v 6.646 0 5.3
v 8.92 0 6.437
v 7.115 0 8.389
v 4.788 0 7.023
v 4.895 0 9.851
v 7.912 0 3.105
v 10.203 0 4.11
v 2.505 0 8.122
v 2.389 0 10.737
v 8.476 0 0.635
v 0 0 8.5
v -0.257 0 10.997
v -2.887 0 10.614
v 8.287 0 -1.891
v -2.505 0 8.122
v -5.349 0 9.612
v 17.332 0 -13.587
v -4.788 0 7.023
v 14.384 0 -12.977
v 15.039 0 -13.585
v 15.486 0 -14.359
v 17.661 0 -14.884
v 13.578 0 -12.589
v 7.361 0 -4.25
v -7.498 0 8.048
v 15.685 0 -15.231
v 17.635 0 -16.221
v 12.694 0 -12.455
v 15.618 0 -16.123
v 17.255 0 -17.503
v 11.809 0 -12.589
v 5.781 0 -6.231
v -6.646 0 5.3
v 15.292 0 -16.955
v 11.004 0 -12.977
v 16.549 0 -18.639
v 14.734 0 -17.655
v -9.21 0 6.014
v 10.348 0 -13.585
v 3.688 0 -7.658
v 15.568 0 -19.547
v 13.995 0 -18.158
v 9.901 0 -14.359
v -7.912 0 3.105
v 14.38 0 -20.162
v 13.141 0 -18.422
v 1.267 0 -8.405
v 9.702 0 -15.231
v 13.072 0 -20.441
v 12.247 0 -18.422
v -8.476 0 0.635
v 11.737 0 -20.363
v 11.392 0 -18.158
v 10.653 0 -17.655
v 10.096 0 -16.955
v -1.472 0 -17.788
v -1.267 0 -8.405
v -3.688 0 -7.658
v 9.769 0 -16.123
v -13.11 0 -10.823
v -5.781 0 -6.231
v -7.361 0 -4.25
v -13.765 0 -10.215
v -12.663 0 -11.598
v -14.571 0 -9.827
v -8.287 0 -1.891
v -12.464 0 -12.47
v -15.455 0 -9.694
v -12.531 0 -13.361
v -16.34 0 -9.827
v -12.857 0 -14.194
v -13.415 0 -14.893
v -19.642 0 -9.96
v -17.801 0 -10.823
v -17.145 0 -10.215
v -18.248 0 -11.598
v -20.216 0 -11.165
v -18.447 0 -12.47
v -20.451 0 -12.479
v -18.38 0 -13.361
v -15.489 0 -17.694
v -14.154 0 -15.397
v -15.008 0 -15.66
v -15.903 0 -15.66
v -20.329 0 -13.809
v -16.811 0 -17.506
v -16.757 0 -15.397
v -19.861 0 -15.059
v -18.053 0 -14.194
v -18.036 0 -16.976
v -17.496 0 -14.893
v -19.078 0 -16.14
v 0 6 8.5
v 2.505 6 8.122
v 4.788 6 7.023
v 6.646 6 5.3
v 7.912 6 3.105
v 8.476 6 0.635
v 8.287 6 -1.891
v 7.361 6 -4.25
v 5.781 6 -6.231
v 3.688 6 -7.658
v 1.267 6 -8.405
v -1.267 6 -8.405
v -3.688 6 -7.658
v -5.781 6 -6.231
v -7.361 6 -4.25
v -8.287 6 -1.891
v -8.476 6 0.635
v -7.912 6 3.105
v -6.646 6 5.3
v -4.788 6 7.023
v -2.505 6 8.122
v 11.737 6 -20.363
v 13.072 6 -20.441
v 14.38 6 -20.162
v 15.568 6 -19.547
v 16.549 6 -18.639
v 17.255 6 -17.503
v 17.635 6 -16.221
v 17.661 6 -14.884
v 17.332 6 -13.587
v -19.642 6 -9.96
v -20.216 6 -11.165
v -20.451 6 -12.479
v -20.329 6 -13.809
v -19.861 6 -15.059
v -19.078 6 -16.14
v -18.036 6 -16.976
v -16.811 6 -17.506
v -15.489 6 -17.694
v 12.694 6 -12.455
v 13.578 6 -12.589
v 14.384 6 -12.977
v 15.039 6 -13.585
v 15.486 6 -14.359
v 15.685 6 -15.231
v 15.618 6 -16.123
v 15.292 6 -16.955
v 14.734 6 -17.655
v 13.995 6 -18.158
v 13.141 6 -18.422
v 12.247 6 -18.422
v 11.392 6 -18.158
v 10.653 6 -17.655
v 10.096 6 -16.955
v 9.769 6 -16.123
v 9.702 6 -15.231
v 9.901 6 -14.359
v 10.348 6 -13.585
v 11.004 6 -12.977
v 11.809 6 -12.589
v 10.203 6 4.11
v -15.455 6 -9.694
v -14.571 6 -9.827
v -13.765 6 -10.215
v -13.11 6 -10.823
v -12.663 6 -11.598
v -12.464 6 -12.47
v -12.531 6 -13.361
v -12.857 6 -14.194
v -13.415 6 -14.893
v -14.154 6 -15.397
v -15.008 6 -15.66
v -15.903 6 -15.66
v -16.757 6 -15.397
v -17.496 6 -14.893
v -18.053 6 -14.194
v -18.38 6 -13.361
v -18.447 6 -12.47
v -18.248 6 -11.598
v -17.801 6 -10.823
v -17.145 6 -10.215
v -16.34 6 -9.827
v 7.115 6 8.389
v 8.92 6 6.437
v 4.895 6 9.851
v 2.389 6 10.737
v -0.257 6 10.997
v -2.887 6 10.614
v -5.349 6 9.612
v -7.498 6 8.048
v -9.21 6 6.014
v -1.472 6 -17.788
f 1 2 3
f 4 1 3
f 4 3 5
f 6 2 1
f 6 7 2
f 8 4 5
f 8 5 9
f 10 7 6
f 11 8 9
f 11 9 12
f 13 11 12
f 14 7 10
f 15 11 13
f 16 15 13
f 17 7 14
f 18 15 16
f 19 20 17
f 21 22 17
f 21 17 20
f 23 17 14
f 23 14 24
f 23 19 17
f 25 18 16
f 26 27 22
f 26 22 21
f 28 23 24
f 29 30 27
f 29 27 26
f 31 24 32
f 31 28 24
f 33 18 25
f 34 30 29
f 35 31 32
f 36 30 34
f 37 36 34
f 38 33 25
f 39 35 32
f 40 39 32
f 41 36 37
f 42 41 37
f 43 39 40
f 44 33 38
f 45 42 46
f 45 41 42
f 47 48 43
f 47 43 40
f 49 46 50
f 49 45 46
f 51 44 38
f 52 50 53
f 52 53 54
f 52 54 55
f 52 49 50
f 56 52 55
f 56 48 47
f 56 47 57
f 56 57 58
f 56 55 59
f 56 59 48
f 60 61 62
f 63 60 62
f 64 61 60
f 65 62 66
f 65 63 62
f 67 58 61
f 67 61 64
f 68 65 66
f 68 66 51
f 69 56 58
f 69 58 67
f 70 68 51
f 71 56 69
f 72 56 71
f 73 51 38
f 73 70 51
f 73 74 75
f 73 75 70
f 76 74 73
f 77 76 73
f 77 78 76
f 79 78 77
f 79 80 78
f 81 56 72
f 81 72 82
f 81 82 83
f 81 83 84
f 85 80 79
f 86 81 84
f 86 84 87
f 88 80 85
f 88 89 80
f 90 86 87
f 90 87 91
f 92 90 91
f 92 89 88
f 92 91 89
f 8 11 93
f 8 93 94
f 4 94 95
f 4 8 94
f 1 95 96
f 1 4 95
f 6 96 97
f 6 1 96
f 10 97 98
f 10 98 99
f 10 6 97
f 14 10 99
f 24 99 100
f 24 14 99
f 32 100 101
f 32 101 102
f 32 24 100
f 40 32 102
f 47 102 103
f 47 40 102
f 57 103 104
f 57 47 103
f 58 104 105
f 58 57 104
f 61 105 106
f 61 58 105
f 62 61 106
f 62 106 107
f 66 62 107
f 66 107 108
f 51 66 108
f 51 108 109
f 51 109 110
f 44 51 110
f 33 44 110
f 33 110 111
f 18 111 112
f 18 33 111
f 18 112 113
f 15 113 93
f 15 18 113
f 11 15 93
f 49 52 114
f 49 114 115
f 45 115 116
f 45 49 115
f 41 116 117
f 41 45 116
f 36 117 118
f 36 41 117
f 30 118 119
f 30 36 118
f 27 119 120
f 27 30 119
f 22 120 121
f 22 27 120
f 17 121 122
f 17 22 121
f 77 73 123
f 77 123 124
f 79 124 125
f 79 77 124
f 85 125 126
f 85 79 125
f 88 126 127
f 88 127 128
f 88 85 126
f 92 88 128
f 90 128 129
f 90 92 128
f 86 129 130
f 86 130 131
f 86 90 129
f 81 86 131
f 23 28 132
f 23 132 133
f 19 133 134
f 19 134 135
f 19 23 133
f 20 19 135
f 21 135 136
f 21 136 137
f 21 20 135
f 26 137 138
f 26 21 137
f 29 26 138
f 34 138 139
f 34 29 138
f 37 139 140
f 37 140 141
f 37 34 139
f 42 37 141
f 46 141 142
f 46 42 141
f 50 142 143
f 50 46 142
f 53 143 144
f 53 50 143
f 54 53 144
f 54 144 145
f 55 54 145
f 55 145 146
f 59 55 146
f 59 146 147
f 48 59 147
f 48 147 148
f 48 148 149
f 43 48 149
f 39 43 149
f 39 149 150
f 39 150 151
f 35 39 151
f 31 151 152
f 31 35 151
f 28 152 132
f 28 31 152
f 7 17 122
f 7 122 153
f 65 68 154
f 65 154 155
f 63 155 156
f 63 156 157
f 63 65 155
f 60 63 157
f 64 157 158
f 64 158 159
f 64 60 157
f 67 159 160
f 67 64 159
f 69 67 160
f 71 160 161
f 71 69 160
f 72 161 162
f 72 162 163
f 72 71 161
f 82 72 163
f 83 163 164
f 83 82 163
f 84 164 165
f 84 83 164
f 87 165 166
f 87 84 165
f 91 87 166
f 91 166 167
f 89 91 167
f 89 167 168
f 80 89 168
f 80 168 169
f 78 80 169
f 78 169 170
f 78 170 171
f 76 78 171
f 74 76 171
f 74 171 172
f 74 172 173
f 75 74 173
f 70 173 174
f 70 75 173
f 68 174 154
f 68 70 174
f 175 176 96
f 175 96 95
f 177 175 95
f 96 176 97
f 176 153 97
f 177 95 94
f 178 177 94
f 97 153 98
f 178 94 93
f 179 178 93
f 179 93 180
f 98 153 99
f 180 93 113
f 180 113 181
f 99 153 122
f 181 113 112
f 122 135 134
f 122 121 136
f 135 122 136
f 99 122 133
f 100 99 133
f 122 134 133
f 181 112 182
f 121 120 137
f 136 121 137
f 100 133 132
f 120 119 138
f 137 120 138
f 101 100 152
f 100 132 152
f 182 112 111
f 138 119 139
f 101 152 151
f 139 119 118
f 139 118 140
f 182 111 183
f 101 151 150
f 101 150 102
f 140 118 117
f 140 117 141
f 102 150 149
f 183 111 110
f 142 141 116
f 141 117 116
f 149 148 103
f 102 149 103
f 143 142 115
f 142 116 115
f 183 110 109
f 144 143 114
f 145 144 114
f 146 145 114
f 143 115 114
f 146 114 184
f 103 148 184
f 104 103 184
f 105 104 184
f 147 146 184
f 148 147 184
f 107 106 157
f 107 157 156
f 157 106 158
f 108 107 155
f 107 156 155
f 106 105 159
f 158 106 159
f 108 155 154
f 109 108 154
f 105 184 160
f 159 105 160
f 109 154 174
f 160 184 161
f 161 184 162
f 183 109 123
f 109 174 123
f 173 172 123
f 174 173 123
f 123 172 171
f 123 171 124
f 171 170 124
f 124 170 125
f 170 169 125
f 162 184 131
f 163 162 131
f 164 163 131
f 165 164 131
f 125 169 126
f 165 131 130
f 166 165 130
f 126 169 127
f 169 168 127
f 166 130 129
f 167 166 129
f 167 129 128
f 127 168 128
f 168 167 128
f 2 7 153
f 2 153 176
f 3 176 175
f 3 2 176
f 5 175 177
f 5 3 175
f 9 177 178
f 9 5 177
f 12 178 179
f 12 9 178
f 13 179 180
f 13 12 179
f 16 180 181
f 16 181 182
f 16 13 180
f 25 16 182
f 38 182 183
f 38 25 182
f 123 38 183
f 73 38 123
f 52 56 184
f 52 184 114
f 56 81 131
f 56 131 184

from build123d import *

# Parameters (mm, degrees)
CROQUIS1_R              = 8.5
CROQUIS1_R_2            = 3
SALIENTE_EXTRUIR1_DEPTH = 6


with BuildPart() as part:
    # Croquis1 → Saliente-Extruir1 (new body)
    with BuildSketch(Plane(origin=(0, 0, 0), x_dir=(1, 0, 0), z_dir=(0, 1, 0))):
        with BuildLine():
            Line((-9.210109587, -6.014472661), (-19.641820946, 9.959862948))
            ThreePointArc((-19.641820946, 9.959862948), (-19.860537089, 15.059054149), (-15.489180854, 17.693600092))
            Line((-15.489180854, 17.693600092), (-1.471942871, 17.788284087))
            Line((-1.471942871, 17.788284087), (11.737098306, 20.363042988))
            ThreePointArc((11.737098306, 20.363042988), (16.549311947, 18.638859347), (17.33162249, 13.587305173))
            Line((17.33162249, 13.587305173), (10.203398333, -4.109825113))
            ThreePointArc((10.203398333, -4.109825113), (1.074046649, -10.947439143), (-9.210109587, -6.014472661))
        make_face()
        with Locations(Location((0, 0, 0), (0, 0, 270))):
            Circle(CROQUIS1_R, mode=Mode.SUBTRACT)
        with Locations(Location((-15.455407497, 12.693714157, 0), (0, 0, 270))):
            Circle(CROQUIS1_R_2, mode=Mode.SUBTRACT)
        with Locations(Location((12.693714157, 15.455407497, 0), (0, 0, 270))):
            Circle(CROQUIS1_R_2, mode=Mode.SUBTRACT)
    extrude(amount=SALIENTE_EXTRUIR1_DEPTH)


solid = part.part
